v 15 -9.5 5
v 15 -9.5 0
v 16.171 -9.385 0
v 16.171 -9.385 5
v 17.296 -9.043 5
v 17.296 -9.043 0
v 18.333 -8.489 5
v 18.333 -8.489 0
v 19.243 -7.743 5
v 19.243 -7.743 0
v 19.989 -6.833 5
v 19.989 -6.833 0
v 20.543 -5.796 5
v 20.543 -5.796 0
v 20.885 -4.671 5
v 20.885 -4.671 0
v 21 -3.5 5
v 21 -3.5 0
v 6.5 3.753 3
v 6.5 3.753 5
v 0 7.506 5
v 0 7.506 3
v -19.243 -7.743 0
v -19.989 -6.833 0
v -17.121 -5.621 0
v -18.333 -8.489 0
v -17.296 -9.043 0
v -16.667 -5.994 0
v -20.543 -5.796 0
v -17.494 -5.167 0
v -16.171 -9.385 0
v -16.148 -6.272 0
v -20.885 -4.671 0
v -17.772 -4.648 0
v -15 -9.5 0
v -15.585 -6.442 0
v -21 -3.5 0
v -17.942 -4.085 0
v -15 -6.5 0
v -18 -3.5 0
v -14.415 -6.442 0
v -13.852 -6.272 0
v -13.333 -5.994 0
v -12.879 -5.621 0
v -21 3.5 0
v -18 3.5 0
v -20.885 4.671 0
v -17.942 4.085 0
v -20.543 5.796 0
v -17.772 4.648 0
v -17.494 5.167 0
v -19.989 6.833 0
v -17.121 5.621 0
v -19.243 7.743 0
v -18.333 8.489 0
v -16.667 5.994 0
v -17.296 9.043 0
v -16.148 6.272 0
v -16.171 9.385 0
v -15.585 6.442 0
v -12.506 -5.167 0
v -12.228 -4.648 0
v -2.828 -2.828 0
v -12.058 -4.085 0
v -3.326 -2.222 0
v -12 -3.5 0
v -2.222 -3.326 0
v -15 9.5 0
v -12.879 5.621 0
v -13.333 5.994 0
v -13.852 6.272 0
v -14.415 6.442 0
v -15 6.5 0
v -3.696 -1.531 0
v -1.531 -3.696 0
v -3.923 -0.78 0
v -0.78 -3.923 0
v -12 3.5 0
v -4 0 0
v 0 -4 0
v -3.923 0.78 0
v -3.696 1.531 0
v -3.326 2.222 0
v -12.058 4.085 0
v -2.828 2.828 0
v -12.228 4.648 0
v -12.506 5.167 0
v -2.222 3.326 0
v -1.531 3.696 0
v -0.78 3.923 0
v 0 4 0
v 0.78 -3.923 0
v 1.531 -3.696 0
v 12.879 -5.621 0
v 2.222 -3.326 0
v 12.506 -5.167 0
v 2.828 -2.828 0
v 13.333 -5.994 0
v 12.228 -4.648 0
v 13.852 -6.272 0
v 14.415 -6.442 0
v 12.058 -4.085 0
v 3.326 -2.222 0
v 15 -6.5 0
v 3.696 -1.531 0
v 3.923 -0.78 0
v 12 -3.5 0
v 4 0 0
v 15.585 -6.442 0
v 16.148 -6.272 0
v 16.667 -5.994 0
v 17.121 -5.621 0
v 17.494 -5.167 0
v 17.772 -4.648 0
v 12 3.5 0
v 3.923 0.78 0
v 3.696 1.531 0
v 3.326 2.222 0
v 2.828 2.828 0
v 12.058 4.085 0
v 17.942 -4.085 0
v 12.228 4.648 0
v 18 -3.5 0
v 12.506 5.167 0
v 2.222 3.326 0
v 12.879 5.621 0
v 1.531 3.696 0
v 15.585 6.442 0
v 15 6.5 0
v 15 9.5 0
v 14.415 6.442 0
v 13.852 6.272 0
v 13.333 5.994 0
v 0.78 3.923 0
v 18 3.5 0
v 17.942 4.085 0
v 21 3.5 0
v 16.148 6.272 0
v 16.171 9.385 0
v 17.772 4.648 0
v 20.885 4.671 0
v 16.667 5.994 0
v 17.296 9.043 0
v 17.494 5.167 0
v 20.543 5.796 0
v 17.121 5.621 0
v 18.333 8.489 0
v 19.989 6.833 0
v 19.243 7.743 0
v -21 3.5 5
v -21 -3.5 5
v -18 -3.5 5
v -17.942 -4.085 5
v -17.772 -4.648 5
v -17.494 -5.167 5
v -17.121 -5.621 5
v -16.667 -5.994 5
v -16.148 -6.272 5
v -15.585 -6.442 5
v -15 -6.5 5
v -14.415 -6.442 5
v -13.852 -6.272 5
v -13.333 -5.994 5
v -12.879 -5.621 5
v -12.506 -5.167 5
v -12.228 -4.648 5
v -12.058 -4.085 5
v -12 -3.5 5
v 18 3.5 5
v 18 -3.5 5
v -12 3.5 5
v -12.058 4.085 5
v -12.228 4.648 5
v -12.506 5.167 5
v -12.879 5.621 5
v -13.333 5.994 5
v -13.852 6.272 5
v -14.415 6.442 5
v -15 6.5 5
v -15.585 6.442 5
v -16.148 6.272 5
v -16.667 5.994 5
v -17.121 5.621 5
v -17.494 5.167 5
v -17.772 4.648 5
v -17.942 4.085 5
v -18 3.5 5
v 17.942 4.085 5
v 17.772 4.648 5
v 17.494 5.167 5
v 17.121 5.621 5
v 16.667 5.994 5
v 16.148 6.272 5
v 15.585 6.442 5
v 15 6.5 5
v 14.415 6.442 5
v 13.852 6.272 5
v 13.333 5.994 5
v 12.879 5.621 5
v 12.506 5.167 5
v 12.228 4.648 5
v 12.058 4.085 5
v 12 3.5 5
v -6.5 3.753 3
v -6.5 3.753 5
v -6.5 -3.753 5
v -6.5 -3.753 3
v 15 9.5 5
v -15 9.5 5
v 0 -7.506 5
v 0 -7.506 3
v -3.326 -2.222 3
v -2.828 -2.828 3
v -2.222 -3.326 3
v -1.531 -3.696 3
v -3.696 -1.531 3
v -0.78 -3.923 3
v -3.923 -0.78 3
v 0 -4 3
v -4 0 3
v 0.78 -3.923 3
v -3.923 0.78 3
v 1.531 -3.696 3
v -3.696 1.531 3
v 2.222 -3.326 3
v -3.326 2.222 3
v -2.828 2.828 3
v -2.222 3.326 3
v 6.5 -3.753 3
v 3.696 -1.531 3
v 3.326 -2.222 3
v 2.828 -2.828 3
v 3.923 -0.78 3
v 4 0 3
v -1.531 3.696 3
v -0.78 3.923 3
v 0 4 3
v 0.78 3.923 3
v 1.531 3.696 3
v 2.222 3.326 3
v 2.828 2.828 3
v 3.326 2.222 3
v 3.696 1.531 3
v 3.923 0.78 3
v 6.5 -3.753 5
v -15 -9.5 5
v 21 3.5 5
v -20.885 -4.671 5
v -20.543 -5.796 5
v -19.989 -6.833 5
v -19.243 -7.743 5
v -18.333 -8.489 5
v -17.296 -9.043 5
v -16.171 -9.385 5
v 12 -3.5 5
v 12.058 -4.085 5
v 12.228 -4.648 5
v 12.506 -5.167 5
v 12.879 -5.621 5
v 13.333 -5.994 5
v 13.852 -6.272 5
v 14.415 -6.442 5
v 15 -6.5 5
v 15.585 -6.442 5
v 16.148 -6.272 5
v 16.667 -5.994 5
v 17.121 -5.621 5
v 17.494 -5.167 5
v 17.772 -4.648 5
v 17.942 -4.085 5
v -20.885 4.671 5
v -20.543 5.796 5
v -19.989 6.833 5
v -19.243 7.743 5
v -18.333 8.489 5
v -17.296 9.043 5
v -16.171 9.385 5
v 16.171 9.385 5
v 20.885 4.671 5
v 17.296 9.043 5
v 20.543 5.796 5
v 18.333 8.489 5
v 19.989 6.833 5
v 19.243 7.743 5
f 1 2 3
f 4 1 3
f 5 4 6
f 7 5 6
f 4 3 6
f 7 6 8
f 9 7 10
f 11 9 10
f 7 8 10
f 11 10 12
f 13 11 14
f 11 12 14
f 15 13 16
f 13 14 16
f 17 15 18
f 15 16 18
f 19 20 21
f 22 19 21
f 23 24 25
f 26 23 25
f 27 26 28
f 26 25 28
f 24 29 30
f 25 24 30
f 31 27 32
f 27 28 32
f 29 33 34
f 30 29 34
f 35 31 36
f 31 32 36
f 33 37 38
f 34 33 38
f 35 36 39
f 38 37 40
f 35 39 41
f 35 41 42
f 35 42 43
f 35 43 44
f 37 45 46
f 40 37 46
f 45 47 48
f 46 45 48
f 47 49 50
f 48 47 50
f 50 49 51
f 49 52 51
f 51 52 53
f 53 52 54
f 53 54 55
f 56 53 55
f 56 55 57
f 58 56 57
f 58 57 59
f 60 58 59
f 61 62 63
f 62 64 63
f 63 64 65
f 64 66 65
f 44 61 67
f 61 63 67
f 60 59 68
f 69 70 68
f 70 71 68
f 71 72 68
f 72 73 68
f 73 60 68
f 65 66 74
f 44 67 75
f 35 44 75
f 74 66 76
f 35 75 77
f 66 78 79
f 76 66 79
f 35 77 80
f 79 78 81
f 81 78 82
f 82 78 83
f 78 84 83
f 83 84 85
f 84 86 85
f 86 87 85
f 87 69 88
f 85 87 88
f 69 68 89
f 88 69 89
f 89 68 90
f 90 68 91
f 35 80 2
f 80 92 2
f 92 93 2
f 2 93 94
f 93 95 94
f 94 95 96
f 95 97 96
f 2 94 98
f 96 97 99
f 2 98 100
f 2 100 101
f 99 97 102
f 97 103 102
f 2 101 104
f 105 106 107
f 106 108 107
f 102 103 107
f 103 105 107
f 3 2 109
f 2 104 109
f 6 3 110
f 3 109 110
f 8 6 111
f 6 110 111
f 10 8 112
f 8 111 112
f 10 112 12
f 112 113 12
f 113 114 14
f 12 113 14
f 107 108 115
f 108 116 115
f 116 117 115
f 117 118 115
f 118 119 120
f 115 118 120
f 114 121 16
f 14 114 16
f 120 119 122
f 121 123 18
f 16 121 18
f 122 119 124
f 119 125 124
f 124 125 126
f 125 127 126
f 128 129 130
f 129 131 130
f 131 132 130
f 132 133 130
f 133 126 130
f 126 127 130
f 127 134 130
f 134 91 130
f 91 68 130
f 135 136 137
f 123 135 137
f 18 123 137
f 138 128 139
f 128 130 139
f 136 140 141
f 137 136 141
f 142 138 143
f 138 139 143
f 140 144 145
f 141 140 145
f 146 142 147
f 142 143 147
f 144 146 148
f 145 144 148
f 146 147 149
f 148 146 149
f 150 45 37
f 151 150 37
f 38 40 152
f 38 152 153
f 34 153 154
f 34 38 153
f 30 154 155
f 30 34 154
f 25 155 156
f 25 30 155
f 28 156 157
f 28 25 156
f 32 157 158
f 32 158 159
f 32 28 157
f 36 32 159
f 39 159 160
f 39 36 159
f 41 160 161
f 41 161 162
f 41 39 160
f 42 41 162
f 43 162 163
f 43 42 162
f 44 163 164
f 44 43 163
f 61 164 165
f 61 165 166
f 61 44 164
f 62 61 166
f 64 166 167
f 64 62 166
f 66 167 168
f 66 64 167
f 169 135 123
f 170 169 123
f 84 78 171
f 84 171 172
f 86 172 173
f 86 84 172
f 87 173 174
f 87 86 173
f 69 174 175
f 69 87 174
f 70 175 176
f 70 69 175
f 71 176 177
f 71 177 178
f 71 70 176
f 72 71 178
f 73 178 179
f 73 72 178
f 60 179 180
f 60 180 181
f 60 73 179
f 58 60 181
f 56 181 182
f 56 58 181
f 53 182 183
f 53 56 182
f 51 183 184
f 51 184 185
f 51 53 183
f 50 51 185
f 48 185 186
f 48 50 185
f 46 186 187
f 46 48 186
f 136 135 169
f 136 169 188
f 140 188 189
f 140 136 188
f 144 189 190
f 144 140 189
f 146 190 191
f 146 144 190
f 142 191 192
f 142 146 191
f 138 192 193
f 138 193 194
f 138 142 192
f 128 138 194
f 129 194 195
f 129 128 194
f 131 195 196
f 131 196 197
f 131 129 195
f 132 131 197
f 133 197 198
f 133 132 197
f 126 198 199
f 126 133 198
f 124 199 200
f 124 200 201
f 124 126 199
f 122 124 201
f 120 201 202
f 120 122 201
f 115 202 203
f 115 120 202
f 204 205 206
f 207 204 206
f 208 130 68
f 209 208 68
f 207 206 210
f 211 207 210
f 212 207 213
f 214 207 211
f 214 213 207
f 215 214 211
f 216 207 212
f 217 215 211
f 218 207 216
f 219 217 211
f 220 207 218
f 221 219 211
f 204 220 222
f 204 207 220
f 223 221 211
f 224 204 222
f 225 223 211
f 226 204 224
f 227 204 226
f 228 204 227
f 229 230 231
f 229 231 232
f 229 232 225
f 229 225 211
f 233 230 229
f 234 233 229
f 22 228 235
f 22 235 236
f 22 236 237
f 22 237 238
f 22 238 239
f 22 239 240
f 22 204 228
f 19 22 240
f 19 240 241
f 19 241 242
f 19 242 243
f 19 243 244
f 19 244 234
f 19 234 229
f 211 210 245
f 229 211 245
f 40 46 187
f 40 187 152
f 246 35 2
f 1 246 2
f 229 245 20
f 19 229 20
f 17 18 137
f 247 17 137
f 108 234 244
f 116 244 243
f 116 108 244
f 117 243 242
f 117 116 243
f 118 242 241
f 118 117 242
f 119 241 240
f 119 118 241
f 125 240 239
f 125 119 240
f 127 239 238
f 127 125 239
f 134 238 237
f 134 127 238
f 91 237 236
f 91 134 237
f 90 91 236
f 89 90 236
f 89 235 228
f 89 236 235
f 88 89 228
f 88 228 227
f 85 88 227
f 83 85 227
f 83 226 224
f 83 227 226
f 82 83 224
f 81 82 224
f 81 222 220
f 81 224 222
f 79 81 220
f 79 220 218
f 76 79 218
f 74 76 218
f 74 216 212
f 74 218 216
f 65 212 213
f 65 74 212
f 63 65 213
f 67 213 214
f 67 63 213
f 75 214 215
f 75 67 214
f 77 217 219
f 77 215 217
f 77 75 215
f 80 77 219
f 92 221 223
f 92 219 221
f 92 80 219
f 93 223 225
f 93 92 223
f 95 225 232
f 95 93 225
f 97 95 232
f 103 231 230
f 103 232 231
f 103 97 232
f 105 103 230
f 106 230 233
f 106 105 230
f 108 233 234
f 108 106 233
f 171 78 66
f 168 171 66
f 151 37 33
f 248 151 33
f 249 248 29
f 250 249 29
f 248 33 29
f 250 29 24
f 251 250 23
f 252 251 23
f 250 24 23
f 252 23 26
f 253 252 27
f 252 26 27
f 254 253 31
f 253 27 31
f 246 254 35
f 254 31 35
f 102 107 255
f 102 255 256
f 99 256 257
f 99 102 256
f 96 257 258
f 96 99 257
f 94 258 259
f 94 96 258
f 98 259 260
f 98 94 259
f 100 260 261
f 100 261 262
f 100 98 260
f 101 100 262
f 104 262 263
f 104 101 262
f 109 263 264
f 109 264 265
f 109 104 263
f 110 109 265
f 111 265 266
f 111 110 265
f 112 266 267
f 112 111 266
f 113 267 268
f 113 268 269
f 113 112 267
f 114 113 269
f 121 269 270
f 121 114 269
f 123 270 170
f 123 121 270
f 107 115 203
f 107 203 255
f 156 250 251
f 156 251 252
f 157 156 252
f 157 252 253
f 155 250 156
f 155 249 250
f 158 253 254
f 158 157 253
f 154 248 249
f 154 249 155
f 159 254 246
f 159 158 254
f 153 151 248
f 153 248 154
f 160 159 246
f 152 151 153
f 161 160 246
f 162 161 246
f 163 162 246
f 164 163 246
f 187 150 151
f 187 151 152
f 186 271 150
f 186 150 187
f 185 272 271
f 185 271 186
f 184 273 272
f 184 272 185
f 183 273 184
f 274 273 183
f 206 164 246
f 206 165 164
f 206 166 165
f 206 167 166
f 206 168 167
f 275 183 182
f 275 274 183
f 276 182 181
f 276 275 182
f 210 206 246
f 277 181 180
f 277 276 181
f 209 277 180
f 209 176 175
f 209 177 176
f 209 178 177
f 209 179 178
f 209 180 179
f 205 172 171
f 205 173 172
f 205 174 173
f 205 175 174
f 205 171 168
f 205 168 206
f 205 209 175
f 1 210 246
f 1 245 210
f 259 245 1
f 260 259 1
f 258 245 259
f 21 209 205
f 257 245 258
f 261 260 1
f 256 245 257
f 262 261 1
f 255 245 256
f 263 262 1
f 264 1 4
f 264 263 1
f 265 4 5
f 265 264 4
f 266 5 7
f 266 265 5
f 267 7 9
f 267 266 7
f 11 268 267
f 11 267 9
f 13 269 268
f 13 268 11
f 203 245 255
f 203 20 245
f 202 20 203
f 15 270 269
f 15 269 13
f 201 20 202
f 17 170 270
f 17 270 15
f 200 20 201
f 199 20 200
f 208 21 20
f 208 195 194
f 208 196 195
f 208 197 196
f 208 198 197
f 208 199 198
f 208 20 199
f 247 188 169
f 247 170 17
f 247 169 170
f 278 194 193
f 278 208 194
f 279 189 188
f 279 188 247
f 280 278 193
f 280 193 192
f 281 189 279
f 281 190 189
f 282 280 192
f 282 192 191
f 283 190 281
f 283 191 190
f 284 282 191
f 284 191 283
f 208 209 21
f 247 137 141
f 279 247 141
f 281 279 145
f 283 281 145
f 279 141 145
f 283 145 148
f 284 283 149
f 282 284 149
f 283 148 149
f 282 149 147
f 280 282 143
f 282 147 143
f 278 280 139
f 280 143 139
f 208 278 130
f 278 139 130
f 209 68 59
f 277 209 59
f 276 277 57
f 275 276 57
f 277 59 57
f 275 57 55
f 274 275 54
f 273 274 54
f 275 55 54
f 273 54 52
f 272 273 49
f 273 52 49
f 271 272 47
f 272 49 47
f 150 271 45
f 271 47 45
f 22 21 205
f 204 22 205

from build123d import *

# Parameters (mm, degrees)
SKETCH_R     = 4
PAD_DEPTH    = 5
POCKET_DEPTH = 2


with BuildPart() as part:
    # Sketch → Pad (new body)
    with BuildSketch(Plane.XY):
        with BuildLine():
            Line((-15, -9.5), (15, -9.5))
            ThreePointArc((15, -9.5), (19.242641, -7.742641), (21, -3.5))
            Line((21, -3.5), (21, 3.5))
            ThreePointArc((21, 3.5), (19.242641, 7.742641), (15, 9.5))
            Line((15, 9.5), (-15, 9.5))
            ThreePointArc((-15, 9.5), (-19.242641, 7.742641), (-21, 3.5))
            Line((-21, 3.5), (-21, -3.5))
            ThreePointArc((-21, -3.5), (-19.242641, -7.742641), (-15, -9.5))
        make_face()
        Circle(SKETCH_R, mode=Mode.SUBTRACT)
        with BuildLine():
            ThreePointArc((-12, 3.5), (-15, 6.5), (-18, 3.5))
            Line((-18, 3.5), (-18, -3.5))
            ThreePointArc((-18, -3.5), (-15, -6.5), (-12, -3.5))
            Line((-12, 3.5), (-12, -3.5))
        make_face(mode=Mode.SUBTRACT)
        with BuildLine():
            ThreePointArc((18, 3.5), (15, 6.5), (12, 3.5))
            Line((12, 3.5), (12, -3.5))
            ThreePointArc((12, -3.5), (15, -6.5), (18, -3.5))
            Line((18, 3.5), (18, -3.5))
        make_face(mode=Mode.SUBTRACT)
    extrude(amount=PAD_DEPTH)

    # Sketch001 (on Face19 of Pad) → Pocket (cut)
    with BuildSketch(Plane.XY.offset(5)):
        Polygon((6.5, 3.752777), (0, 7.505553), (-6.5, 3.752777), (-6.5, -3.752777), (0, -7.505553), (6.5, -3.752777), align=None)
    extrude(amount=-POCKET_DEPTH, mode=Mode.SUBTRACT)


solid = part.part
